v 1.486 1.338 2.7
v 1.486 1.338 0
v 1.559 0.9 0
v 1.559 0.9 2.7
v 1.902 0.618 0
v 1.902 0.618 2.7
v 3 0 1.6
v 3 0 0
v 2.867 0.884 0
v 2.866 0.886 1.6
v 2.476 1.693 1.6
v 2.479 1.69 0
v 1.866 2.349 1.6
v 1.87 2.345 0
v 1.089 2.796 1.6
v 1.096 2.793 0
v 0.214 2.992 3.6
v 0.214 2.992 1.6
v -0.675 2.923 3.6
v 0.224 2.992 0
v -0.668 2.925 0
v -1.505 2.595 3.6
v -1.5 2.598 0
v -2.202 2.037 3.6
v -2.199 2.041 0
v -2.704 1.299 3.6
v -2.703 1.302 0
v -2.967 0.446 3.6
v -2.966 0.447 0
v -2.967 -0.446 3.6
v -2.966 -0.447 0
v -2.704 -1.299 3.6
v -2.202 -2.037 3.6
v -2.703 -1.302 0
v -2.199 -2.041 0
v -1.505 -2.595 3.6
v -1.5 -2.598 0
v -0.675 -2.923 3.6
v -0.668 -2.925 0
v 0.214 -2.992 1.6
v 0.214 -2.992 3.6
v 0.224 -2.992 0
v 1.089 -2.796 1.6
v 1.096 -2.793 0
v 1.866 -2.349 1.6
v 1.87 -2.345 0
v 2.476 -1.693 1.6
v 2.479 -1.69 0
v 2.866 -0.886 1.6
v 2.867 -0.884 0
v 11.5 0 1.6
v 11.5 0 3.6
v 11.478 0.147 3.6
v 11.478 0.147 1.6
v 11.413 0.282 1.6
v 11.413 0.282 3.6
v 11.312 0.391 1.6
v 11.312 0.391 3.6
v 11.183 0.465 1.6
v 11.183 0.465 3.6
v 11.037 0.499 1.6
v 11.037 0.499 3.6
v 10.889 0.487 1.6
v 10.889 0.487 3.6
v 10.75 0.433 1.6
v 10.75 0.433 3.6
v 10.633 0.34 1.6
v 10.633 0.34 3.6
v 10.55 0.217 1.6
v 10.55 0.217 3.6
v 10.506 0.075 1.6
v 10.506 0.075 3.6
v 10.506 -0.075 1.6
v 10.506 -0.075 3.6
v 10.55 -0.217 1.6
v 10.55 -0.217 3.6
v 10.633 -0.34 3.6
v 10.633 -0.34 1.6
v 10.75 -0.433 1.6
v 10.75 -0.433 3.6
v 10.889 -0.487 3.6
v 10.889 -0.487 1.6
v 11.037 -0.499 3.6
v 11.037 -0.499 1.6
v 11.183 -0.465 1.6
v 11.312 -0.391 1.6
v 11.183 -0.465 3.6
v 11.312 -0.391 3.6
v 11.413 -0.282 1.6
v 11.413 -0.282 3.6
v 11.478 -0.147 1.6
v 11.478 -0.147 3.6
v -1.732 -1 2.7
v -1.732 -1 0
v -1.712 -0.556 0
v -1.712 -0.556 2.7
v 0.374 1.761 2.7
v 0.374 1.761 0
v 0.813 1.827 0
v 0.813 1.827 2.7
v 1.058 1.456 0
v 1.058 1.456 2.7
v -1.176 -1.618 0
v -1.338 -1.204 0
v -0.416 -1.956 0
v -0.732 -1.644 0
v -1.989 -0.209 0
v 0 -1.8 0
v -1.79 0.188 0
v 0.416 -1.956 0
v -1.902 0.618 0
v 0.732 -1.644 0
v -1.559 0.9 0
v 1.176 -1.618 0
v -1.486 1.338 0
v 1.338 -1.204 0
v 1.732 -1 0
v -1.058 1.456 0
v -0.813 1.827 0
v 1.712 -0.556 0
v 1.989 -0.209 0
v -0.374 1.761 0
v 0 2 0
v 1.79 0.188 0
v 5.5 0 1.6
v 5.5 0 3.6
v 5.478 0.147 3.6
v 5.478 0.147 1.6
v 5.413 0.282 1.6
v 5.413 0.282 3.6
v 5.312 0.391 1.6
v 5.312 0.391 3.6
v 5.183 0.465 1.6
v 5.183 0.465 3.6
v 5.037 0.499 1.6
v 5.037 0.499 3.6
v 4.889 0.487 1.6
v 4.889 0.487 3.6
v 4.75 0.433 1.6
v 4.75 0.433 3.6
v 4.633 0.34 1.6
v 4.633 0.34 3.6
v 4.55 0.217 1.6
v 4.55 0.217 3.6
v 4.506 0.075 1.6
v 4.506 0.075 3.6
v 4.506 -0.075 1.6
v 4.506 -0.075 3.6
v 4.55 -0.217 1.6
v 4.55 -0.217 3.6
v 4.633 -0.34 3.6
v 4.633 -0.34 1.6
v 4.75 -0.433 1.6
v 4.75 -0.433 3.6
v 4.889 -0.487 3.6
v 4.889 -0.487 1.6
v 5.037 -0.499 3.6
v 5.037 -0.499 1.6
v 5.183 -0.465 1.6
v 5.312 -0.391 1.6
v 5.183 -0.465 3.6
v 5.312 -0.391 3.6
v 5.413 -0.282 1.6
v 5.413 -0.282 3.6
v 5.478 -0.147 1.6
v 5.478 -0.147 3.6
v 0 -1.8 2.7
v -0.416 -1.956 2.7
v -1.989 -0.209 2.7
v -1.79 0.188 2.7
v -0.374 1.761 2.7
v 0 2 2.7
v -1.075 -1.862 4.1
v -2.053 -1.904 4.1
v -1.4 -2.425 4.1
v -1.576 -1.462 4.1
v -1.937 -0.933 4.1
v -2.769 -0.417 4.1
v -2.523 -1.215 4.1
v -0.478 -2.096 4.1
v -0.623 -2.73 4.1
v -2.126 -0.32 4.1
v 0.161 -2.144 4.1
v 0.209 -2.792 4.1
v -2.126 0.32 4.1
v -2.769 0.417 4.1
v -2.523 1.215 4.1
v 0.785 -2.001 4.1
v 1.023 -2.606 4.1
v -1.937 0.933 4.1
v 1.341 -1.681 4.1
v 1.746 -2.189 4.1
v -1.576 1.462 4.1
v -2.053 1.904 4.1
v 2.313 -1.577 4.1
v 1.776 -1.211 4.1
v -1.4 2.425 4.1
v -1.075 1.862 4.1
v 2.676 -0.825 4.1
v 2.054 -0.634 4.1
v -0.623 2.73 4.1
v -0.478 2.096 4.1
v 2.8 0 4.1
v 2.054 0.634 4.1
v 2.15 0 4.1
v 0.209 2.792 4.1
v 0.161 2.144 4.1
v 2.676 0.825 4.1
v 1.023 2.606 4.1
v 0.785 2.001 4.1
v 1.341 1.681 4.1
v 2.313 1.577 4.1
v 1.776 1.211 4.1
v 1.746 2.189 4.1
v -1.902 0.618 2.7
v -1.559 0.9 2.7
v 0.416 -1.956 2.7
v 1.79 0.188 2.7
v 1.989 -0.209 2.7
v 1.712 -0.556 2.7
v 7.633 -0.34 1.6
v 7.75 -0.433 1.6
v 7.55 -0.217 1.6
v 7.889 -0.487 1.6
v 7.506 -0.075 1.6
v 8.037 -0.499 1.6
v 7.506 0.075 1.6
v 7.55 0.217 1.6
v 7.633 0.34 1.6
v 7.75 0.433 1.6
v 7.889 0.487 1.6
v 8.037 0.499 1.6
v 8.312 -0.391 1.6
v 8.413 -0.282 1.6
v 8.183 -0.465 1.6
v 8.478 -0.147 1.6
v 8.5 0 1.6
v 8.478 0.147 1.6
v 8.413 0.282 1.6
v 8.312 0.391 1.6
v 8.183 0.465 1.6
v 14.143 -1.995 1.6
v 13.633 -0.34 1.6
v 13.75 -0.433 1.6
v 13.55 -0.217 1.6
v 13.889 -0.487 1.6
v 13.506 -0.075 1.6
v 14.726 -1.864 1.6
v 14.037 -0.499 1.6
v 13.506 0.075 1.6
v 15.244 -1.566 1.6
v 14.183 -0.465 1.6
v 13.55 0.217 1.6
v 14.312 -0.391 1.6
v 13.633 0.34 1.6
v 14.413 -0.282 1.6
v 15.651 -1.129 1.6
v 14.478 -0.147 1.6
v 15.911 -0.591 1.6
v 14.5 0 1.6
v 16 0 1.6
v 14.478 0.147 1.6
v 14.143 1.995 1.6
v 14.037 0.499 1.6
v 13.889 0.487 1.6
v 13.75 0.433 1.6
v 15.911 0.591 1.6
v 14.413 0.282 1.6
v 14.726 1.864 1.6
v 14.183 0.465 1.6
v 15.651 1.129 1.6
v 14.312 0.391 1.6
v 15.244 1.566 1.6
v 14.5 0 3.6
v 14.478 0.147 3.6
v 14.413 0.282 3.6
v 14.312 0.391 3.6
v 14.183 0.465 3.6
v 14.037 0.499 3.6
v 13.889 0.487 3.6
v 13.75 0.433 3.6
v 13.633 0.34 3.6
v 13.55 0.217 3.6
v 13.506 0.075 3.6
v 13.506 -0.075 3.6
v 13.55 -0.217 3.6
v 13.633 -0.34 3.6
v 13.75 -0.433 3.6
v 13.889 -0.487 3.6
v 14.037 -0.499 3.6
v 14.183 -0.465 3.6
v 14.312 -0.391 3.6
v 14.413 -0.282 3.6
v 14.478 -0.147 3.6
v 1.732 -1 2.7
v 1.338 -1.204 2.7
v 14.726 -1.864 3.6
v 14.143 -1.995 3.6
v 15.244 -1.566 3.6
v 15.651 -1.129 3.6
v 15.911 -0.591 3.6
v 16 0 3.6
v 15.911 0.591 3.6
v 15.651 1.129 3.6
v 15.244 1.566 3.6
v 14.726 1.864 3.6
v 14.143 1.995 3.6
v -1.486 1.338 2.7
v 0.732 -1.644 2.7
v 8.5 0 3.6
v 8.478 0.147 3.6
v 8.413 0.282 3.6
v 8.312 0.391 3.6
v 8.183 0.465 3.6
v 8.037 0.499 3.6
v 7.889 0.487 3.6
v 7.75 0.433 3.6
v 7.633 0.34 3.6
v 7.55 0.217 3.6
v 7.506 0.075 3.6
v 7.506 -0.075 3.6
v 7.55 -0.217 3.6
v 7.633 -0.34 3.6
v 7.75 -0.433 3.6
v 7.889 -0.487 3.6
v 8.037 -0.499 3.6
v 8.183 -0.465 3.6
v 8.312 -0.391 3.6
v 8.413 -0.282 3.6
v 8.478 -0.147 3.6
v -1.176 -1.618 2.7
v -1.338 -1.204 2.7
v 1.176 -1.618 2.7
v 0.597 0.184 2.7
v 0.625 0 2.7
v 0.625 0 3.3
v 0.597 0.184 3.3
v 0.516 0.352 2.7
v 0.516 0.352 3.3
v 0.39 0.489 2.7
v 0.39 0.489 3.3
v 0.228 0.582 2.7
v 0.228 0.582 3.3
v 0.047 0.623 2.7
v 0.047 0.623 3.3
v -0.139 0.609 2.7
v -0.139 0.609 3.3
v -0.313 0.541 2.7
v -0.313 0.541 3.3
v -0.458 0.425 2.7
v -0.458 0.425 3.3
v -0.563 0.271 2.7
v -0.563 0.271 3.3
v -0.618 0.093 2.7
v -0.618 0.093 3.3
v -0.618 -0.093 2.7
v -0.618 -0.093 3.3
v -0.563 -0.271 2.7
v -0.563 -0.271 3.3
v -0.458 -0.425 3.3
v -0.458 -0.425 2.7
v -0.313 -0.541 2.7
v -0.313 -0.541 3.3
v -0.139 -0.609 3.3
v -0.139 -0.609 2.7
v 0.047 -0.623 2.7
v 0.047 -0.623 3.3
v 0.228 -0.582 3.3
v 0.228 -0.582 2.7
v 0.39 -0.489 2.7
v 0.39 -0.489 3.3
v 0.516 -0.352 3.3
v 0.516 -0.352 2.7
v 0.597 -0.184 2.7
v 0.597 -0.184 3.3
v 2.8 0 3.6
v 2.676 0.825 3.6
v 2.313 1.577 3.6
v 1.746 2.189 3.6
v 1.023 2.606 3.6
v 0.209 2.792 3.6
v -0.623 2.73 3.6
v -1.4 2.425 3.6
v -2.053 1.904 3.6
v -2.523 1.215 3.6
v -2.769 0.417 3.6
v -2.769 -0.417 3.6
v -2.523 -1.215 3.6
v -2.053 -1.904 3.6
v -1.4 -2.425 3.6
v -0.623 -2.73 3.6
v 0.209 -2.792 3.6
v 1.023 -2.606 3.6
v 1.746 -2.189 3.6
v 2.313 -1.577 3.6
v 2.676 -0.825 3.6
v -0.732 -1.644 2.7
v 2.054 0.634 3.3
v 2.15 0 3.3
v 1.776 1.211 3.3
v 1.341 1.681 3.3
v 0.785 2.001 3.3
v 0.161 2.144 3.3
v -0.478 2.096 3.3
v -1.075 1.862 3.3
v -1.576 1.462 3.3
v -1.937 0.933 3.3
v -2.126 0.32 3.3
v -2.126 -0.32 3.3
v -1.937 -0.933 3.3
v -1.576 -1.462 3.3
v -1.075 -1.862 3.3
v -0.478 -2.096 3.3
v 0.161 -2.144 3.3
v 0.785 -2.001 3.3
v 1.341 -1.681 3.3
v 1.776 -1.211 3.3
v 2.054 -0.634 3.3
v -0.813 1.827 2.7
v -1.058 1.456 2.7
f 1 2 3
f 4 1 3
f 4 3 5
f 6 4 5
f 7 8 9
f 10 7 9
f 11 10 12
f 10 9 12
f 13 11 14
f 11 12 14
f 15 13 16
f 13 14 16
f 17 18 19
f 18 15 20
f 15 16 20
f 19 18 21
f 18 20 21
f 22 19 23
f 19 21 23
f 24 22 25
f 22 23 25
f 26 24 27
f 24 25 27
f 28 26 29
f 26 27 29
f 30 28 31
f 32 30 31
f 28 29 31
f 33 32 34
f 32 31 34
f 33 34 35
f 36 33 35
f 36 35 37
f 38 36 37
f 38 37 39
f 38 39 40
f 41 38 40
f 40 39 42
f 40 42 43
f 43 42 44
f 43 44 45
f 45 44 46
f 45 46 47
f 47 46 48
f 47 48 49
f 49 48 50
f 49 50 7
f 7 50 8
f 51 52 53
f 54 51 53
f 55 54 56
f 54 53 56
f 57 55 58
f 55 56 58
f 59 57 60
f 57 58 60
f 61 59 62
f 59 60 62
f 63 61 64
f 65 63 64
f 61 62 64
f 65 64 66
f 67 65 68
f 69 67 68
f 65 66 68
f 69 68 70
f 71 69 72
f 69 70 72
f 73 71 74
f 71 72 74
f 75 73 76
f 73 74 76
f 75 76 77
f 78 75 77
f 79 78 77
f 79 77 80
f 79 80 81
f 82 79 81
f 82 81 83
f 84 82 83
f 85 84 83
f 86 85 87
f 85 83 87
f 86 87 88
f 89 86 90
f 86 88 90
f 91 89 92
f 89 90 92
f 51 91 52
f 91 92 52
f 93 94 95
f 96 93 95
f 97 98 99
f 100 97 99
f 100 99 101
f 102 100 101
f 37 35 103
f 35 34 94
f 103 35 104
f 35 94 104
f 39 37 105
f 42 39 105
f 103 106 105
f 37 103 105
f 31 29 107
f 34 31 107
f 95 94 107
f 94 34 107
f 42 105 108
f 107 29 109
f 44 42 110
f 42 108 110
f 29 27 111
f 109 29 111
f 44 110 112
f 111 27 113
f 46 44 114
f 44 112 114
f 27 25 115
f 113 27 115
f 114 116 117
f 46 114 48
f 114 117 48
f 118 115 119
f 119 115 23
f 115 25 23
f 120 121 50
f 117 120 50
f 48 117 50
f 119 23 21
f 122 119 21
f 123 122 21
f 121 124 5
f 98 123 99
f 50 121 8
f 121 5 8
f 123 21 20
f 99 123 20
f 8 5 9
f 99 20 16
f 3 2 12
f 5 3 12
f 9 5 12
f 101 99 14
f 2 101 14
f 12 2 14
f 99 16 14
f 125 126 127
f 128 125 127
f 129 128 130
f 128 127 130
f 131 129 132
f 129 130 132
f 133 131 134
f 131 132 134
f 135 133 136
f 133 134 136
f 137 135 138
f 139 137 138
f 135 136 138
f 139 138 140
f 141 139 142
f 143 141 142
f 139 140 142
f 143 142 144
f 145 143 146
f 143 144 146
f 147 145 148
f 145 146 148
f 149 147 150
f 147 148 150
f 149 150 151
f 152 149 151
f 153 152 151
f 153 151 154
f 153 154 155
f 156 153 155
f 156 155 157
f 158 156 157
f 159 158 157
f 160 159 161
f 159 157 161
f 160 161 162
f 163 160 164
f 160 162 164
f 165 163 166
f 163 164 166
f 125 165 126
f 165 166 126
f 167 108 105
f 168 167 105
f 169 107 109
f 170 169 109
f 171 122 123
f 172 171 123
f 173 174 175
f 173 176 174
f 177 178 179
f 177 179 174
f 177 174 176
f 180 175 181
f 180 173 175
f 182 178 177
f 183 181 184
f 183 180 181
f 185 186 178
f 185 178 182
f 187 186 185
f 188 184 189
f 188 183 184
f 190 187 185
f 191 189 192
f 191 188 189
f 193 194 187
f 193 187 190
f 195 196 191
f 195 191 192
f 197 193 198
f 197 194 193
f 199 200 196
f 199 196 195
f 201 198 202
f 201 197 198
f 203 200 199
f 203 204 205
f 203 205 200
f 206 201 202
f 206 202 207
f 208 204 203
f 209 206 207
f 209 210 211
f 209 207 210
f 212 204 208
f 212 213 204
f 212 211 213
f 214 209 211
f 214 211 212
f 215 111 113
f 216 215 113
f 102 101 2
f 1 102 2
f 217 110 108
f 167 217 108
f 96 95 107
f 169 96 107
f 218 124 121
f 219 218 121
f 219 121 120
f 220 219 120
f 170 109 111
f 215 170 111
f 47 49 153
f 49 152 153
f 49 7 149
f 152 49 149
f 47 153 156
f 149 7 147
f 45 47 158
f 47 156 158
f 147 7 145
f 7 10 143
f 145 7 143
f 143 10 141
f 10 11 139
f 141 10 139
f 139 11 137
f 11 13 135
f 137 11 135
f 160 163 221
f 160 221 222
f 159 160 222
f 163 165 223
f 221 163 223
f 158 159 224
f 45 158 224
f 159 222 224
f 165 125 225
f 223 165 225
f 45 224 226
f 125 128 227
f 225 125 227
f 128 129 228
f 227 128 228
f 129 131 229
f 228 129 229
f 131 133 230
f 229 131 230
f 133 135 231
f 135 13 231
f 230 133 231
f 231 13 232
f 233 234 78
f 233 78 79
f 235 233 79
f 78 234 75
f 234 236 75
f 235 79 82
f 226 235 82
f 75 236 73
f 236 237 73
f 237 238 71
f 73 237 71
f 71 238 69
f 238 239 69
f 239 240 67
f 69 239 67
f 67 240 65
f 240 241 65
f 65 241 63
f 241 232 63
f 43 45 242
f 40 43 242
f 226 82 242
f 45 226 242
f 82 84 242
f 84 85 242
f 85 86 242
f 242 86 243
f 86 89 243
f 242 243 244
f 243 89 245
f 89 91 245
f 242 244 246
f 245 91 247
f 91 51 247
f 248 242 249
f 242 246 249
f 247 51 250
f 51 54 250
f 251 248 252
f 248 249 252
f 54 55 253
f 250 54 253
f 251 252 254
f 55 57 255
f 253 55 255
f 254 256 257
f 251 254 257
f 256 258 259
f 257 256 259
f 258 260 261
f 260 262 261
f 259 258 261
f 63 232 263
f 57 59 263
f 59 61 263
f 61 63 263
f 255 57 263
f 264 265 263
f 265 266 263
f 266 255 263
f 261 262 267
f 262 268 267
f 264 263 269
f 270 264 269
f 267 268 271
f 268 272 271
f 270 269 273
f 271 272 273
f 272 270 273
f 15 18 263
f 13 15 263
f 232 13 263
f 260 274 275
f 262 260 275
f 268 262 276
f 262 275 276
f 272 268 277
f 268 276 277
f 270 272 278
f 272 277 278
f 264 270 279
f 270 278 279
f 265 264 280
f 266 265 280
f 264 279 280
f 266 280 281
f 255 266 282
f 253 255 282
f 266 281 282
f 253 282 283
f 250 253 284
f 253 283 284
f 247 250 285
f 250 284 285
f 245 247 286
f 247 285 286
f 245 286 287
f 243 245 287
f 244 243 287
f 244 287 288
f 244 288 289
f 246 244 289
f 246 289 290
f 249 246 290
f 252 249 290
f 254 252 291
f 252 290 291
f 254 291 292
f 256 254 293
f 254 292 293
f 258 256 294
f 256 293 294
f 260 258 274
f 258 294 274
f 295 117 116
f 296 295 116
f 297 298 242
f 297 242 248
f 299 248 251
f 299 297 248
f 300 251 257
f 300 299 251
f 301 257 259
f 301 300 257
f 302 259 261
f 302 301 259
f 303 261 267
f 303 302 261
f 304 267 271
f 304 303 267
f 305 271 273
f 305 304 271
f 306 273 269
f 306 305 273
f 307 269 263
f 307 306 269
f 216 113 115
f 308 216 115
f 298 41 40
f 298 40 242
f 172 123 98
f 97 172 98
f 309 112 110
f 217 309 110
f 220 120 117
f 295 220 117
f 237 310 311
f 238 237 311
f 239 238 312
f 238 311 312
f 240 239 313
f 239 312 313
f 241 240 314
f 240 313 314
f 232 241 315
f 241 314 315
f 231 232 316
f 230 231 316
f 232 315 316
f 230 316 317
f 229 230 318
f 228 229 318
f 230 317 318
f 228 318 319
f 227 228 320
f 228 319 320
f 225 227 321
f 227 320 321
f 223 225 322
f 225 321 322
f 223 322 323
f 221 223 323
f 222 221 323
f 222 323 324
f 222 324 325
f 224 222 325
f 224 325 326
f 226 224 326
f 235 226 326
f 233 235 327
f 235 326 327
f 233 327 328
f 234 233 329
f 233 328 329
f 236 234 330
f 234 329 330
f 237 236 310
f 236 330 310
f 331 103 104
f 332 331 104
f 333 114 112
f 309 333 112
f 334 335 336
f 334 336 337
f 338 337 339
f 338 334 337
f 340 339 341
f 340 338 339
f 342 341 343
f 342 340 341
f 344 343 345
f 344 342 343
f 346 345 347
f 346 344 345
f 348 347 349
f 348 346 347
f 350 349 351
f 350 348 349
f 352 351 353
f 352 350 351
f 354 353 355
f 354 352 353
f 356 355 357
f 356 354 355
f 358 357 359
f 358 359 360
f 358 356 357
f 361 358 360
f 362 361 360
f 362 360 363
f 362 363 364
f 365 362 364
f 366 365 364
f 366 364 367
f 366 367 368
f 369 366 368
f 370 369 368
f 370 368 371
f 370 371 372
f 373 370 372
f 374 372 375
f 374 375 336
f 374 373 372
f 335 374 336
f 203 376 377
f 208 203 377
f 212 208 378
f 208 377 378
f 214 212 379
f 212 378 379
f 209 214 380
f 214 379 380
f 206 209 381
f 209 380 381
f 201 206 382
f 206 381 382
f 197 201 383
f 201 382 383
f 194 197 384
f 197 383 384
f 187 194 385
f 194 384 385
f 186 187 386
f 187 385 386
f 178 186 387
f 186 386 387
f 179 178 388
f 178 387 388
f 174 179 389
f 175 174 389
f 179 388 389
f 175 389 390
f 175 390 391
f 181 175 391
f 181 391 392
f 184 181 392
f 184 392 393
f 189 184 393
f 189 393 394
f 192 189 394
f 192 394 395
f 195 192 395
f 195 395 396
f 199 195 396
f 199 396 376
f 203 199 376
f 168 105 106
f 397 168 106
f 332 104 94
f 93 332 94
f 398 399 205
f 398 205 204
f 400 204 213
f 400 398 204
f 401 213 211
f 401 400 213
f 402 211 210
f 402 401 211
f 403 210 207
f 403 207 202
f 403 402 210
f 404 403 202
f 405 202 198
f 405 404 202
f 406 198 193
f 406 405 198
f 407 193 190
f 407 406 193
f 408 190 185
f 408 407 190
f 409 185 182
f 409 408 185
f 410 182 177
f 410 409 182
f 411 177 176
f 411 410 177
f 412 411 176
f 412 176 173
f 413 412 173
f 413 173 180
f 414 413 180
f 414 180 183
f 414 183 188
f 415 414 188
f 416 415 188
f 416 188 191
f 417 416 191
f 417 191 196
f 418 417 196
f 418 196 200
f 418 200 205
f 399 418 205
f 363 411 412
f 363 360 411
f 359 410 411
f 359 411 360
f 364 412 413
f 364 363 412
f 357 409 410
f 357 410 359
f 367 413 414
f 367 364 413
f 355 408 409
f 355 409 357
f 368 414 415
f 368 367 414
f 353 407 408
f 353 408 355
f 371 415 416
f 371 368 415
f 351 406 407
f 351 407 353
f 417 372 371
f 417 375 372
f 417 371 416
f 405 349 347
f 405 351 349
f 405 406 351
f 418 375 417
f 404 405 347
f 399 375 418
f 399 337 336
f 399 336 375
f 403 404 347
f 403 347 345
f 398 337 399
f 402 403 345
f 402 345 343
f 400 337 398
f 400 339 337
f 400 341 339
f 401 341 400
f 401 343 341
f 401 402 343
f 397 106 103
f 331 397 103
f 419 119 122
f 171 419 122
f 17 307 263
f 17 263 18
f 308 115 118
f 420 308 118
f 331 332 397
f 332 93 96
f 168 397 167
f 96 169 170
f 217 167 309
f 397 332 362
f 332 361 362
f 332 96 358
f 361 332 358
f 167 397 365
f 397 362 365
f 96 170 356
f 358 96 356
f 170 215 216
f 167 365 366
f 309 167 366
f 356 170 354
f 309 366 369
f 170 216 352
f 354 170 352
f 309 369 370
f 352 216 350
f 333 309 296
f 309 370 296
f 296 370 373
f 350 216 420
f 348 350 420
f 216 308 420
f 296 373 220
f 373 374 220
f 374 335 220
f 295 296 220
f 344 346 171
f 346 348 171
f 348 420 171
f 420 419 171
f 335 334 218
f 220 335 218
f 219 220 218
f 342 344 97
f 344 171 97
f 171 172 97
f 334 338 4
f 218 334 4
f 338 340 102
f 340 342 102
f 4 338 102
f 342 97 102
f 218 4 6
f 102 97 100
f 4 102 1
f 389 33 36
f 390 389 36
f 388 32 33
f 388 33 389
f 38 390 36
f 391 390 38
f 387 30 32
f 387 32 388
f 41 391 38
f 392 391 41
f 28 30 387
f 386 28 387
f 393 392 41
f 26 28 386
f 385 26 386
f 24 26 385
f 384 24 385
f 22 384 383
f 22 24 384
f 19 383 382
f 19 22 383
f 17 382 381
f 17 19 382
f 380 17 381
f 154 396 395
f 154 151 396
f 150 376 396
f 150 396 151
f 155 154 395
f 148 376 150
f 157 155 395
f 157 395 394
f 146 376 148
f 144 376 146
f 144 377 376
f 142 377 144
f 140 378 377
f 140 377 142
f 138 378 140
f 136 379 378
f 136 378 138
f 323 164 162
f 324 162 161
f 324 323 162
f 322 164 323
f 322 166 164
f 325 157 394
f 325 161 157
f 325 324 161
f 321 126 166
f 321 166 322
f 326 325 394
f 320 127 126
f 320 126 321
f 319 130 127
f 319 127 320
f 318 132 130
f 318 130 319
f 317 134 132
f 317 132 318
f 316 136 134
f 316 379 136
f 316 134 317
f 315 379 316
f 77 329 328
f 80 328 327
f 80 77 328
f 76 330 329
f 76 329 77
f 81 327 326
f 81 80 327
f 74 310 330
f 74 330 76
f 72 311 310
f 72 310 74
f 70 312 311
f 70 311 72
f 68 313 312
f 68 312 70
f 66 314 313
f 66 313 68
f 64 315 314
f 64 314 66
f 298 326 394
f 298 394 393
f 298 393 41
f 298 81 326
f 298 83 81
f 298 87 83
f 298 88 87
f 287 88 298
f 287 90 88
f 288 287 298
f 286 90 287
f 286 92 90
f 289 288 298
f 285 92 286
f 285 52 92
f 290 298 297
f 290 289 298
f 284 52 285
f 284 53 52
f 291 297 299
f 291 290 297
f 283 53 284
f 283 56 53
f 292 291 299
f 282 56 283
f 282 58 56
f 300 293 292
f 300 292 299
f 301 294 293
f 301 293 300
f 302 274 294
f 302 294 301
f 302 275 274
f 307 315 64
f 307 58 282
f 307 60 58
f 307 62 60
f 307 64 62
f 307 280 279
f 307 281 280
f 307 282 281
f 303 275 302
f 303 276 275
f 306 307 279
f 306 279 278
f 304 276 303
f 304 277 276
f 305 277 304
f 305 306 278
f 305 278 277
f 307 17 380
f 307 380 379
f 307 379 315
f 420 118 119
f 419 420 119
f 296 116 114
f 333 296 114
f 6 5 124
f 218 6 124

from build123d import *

# Parameters (mm, degrees)
SKETCH2_R           = 3
SKETCH2_R_2         = 2.8
BOSS_EXTRUDE1_DEPTH = 3.6
SKETCH2_3_R         = 2.8
SKETCH2_3_R_2       = 2.15
BOSS_EXTRUDE2_DEPTH = 4.1
BOSS_EXTRUDE3_START = 2.7
SKETCH2_4_R         = 2.15
SKETCH2_4_R_2       = 0.625
BOSS_EXTRUDE3_DEPTH = 0.6
SKETCH2_5_R         = 2.15
BOSS_EXTRUDE4_DEPTH = 2.7
BOSS_EXTRUDE5_START = 3.6
SKETCH2_6_R         = 0.5
BOSS_EXTRUDE5_DEPTH = 2


with BuildPart() as part:
    # Sketch2 → Boss-Extrude1 (new body)
    with BuildSketch(Plane.XY):
        Circle(SKETCH2_R)
        Circle(SKETCH2_R_2, mode=Mode.SUBTRACT)
    extrude(amount=BOSS_EXTRUDE1_DEPTH)

    # Sketch2<3> → Boss-Extrude2 (add)
    with BuildSketch(Plane.XY):
        Circle(SKETCH2_3_R)
        Circle(SKETCH2_3_R_2, mode=Mode.SUBTRACT)
    extrude(amount=BOSS_EXTRUDE2_DEPTH)

    # Sketch2<4> → Boss-Extrude3 (add)
    with BuildSketch(Plane.XY.offset(BOSS_EXTRUDE3_START)):
        Circle(SKETCH2_4_R)
        Circle(SKETCH2_4_R_2, mode=Mode.SUBTRACT)
    extrude(amount=BOSS_EXTRUDE3_DEPTH)

    # Sketch2<5> → Boss-Extrude4 (add)
    with BuildSketch(Plane.XY):
        Circle(SKETCH2_5_R)
        Polygon((-0.374241043, 1.760665681), (0, 2), (0.374241043, 1.760665681), (0.813473286, 1.827090915), (1.058013454, 1.45623059), (1.486289651, 1.338261213), (1.558845727, 0.9), (1.902113033, 0.618033989), (1.790139412, 0.188151234), (1.989043791, -0.209056927), (1.711901729, -0.55623059), (1.732050808, -1), (1.337660686, -1.204435091), (1.175570505, -1.618033989), (0.732125958, -1.644381824), (0.415823382, -1.956295201), (0, -1.8), (-0.415823382, -1.956295201), (-0.732125958, -1.644381824), (-1.175570505, -1.618033989), (-1.337660686, -1.204435091), (-1.732050808, -1), (-1.711901729, -0.55623059), (-1.989043791, -0.209056927), (-1.790139412, 0.188151234), (-1.902113033, 0.618033989), (-1.558845727, 0.9), (-1.486289651, 1.338261213), (-1.058013454, 1.45623059), (-0.813473286, 1.827090915), align=None, mode=Mode.SUBTRACT)
    extrude(amount=BOSS_EXTRUDE4_DEPTH)

    # Sketch2<6> → Boss-Extrude5 (add)
    with BuildSketch(Plane.XY.offset(BOSS_EXTRUDE5_START)):
        with BuildLine():
            Line((14.142857143, 1.994891435), (0.214285714, 2.992337152))
            ThreePointArc((0.214285714, 2.992337152), (3, 0), (0.214285714, -2.992337152))
            Line((0.214285714, -2.992337152), (14.142857143, -1.994891435))
            ThreePointArc((14.142857143, -1.994891435), (16, 0), (14.142857143, 1.994891435))
        make_face()
        with Locations((5, 0)):
            Circle(SKETCH2_6_R, mode=Mode.SUBTRACT)
        with Locations((8, 0)):
            Circle(SKETCH2_6_R, mode=Mode.SUBTRACT)
        with Locations((11, 0)):
            Circle(SKETCH2_6_R, mode=Mode.SUBTRACT)
        with Locations((14, 0)):
            Circle(SKETCH2_6_R, mode=Mode.SUBTRACT)
    extrude(amount=-BOSS_EXTRUDE5_DEPTH)


solid = part.part
